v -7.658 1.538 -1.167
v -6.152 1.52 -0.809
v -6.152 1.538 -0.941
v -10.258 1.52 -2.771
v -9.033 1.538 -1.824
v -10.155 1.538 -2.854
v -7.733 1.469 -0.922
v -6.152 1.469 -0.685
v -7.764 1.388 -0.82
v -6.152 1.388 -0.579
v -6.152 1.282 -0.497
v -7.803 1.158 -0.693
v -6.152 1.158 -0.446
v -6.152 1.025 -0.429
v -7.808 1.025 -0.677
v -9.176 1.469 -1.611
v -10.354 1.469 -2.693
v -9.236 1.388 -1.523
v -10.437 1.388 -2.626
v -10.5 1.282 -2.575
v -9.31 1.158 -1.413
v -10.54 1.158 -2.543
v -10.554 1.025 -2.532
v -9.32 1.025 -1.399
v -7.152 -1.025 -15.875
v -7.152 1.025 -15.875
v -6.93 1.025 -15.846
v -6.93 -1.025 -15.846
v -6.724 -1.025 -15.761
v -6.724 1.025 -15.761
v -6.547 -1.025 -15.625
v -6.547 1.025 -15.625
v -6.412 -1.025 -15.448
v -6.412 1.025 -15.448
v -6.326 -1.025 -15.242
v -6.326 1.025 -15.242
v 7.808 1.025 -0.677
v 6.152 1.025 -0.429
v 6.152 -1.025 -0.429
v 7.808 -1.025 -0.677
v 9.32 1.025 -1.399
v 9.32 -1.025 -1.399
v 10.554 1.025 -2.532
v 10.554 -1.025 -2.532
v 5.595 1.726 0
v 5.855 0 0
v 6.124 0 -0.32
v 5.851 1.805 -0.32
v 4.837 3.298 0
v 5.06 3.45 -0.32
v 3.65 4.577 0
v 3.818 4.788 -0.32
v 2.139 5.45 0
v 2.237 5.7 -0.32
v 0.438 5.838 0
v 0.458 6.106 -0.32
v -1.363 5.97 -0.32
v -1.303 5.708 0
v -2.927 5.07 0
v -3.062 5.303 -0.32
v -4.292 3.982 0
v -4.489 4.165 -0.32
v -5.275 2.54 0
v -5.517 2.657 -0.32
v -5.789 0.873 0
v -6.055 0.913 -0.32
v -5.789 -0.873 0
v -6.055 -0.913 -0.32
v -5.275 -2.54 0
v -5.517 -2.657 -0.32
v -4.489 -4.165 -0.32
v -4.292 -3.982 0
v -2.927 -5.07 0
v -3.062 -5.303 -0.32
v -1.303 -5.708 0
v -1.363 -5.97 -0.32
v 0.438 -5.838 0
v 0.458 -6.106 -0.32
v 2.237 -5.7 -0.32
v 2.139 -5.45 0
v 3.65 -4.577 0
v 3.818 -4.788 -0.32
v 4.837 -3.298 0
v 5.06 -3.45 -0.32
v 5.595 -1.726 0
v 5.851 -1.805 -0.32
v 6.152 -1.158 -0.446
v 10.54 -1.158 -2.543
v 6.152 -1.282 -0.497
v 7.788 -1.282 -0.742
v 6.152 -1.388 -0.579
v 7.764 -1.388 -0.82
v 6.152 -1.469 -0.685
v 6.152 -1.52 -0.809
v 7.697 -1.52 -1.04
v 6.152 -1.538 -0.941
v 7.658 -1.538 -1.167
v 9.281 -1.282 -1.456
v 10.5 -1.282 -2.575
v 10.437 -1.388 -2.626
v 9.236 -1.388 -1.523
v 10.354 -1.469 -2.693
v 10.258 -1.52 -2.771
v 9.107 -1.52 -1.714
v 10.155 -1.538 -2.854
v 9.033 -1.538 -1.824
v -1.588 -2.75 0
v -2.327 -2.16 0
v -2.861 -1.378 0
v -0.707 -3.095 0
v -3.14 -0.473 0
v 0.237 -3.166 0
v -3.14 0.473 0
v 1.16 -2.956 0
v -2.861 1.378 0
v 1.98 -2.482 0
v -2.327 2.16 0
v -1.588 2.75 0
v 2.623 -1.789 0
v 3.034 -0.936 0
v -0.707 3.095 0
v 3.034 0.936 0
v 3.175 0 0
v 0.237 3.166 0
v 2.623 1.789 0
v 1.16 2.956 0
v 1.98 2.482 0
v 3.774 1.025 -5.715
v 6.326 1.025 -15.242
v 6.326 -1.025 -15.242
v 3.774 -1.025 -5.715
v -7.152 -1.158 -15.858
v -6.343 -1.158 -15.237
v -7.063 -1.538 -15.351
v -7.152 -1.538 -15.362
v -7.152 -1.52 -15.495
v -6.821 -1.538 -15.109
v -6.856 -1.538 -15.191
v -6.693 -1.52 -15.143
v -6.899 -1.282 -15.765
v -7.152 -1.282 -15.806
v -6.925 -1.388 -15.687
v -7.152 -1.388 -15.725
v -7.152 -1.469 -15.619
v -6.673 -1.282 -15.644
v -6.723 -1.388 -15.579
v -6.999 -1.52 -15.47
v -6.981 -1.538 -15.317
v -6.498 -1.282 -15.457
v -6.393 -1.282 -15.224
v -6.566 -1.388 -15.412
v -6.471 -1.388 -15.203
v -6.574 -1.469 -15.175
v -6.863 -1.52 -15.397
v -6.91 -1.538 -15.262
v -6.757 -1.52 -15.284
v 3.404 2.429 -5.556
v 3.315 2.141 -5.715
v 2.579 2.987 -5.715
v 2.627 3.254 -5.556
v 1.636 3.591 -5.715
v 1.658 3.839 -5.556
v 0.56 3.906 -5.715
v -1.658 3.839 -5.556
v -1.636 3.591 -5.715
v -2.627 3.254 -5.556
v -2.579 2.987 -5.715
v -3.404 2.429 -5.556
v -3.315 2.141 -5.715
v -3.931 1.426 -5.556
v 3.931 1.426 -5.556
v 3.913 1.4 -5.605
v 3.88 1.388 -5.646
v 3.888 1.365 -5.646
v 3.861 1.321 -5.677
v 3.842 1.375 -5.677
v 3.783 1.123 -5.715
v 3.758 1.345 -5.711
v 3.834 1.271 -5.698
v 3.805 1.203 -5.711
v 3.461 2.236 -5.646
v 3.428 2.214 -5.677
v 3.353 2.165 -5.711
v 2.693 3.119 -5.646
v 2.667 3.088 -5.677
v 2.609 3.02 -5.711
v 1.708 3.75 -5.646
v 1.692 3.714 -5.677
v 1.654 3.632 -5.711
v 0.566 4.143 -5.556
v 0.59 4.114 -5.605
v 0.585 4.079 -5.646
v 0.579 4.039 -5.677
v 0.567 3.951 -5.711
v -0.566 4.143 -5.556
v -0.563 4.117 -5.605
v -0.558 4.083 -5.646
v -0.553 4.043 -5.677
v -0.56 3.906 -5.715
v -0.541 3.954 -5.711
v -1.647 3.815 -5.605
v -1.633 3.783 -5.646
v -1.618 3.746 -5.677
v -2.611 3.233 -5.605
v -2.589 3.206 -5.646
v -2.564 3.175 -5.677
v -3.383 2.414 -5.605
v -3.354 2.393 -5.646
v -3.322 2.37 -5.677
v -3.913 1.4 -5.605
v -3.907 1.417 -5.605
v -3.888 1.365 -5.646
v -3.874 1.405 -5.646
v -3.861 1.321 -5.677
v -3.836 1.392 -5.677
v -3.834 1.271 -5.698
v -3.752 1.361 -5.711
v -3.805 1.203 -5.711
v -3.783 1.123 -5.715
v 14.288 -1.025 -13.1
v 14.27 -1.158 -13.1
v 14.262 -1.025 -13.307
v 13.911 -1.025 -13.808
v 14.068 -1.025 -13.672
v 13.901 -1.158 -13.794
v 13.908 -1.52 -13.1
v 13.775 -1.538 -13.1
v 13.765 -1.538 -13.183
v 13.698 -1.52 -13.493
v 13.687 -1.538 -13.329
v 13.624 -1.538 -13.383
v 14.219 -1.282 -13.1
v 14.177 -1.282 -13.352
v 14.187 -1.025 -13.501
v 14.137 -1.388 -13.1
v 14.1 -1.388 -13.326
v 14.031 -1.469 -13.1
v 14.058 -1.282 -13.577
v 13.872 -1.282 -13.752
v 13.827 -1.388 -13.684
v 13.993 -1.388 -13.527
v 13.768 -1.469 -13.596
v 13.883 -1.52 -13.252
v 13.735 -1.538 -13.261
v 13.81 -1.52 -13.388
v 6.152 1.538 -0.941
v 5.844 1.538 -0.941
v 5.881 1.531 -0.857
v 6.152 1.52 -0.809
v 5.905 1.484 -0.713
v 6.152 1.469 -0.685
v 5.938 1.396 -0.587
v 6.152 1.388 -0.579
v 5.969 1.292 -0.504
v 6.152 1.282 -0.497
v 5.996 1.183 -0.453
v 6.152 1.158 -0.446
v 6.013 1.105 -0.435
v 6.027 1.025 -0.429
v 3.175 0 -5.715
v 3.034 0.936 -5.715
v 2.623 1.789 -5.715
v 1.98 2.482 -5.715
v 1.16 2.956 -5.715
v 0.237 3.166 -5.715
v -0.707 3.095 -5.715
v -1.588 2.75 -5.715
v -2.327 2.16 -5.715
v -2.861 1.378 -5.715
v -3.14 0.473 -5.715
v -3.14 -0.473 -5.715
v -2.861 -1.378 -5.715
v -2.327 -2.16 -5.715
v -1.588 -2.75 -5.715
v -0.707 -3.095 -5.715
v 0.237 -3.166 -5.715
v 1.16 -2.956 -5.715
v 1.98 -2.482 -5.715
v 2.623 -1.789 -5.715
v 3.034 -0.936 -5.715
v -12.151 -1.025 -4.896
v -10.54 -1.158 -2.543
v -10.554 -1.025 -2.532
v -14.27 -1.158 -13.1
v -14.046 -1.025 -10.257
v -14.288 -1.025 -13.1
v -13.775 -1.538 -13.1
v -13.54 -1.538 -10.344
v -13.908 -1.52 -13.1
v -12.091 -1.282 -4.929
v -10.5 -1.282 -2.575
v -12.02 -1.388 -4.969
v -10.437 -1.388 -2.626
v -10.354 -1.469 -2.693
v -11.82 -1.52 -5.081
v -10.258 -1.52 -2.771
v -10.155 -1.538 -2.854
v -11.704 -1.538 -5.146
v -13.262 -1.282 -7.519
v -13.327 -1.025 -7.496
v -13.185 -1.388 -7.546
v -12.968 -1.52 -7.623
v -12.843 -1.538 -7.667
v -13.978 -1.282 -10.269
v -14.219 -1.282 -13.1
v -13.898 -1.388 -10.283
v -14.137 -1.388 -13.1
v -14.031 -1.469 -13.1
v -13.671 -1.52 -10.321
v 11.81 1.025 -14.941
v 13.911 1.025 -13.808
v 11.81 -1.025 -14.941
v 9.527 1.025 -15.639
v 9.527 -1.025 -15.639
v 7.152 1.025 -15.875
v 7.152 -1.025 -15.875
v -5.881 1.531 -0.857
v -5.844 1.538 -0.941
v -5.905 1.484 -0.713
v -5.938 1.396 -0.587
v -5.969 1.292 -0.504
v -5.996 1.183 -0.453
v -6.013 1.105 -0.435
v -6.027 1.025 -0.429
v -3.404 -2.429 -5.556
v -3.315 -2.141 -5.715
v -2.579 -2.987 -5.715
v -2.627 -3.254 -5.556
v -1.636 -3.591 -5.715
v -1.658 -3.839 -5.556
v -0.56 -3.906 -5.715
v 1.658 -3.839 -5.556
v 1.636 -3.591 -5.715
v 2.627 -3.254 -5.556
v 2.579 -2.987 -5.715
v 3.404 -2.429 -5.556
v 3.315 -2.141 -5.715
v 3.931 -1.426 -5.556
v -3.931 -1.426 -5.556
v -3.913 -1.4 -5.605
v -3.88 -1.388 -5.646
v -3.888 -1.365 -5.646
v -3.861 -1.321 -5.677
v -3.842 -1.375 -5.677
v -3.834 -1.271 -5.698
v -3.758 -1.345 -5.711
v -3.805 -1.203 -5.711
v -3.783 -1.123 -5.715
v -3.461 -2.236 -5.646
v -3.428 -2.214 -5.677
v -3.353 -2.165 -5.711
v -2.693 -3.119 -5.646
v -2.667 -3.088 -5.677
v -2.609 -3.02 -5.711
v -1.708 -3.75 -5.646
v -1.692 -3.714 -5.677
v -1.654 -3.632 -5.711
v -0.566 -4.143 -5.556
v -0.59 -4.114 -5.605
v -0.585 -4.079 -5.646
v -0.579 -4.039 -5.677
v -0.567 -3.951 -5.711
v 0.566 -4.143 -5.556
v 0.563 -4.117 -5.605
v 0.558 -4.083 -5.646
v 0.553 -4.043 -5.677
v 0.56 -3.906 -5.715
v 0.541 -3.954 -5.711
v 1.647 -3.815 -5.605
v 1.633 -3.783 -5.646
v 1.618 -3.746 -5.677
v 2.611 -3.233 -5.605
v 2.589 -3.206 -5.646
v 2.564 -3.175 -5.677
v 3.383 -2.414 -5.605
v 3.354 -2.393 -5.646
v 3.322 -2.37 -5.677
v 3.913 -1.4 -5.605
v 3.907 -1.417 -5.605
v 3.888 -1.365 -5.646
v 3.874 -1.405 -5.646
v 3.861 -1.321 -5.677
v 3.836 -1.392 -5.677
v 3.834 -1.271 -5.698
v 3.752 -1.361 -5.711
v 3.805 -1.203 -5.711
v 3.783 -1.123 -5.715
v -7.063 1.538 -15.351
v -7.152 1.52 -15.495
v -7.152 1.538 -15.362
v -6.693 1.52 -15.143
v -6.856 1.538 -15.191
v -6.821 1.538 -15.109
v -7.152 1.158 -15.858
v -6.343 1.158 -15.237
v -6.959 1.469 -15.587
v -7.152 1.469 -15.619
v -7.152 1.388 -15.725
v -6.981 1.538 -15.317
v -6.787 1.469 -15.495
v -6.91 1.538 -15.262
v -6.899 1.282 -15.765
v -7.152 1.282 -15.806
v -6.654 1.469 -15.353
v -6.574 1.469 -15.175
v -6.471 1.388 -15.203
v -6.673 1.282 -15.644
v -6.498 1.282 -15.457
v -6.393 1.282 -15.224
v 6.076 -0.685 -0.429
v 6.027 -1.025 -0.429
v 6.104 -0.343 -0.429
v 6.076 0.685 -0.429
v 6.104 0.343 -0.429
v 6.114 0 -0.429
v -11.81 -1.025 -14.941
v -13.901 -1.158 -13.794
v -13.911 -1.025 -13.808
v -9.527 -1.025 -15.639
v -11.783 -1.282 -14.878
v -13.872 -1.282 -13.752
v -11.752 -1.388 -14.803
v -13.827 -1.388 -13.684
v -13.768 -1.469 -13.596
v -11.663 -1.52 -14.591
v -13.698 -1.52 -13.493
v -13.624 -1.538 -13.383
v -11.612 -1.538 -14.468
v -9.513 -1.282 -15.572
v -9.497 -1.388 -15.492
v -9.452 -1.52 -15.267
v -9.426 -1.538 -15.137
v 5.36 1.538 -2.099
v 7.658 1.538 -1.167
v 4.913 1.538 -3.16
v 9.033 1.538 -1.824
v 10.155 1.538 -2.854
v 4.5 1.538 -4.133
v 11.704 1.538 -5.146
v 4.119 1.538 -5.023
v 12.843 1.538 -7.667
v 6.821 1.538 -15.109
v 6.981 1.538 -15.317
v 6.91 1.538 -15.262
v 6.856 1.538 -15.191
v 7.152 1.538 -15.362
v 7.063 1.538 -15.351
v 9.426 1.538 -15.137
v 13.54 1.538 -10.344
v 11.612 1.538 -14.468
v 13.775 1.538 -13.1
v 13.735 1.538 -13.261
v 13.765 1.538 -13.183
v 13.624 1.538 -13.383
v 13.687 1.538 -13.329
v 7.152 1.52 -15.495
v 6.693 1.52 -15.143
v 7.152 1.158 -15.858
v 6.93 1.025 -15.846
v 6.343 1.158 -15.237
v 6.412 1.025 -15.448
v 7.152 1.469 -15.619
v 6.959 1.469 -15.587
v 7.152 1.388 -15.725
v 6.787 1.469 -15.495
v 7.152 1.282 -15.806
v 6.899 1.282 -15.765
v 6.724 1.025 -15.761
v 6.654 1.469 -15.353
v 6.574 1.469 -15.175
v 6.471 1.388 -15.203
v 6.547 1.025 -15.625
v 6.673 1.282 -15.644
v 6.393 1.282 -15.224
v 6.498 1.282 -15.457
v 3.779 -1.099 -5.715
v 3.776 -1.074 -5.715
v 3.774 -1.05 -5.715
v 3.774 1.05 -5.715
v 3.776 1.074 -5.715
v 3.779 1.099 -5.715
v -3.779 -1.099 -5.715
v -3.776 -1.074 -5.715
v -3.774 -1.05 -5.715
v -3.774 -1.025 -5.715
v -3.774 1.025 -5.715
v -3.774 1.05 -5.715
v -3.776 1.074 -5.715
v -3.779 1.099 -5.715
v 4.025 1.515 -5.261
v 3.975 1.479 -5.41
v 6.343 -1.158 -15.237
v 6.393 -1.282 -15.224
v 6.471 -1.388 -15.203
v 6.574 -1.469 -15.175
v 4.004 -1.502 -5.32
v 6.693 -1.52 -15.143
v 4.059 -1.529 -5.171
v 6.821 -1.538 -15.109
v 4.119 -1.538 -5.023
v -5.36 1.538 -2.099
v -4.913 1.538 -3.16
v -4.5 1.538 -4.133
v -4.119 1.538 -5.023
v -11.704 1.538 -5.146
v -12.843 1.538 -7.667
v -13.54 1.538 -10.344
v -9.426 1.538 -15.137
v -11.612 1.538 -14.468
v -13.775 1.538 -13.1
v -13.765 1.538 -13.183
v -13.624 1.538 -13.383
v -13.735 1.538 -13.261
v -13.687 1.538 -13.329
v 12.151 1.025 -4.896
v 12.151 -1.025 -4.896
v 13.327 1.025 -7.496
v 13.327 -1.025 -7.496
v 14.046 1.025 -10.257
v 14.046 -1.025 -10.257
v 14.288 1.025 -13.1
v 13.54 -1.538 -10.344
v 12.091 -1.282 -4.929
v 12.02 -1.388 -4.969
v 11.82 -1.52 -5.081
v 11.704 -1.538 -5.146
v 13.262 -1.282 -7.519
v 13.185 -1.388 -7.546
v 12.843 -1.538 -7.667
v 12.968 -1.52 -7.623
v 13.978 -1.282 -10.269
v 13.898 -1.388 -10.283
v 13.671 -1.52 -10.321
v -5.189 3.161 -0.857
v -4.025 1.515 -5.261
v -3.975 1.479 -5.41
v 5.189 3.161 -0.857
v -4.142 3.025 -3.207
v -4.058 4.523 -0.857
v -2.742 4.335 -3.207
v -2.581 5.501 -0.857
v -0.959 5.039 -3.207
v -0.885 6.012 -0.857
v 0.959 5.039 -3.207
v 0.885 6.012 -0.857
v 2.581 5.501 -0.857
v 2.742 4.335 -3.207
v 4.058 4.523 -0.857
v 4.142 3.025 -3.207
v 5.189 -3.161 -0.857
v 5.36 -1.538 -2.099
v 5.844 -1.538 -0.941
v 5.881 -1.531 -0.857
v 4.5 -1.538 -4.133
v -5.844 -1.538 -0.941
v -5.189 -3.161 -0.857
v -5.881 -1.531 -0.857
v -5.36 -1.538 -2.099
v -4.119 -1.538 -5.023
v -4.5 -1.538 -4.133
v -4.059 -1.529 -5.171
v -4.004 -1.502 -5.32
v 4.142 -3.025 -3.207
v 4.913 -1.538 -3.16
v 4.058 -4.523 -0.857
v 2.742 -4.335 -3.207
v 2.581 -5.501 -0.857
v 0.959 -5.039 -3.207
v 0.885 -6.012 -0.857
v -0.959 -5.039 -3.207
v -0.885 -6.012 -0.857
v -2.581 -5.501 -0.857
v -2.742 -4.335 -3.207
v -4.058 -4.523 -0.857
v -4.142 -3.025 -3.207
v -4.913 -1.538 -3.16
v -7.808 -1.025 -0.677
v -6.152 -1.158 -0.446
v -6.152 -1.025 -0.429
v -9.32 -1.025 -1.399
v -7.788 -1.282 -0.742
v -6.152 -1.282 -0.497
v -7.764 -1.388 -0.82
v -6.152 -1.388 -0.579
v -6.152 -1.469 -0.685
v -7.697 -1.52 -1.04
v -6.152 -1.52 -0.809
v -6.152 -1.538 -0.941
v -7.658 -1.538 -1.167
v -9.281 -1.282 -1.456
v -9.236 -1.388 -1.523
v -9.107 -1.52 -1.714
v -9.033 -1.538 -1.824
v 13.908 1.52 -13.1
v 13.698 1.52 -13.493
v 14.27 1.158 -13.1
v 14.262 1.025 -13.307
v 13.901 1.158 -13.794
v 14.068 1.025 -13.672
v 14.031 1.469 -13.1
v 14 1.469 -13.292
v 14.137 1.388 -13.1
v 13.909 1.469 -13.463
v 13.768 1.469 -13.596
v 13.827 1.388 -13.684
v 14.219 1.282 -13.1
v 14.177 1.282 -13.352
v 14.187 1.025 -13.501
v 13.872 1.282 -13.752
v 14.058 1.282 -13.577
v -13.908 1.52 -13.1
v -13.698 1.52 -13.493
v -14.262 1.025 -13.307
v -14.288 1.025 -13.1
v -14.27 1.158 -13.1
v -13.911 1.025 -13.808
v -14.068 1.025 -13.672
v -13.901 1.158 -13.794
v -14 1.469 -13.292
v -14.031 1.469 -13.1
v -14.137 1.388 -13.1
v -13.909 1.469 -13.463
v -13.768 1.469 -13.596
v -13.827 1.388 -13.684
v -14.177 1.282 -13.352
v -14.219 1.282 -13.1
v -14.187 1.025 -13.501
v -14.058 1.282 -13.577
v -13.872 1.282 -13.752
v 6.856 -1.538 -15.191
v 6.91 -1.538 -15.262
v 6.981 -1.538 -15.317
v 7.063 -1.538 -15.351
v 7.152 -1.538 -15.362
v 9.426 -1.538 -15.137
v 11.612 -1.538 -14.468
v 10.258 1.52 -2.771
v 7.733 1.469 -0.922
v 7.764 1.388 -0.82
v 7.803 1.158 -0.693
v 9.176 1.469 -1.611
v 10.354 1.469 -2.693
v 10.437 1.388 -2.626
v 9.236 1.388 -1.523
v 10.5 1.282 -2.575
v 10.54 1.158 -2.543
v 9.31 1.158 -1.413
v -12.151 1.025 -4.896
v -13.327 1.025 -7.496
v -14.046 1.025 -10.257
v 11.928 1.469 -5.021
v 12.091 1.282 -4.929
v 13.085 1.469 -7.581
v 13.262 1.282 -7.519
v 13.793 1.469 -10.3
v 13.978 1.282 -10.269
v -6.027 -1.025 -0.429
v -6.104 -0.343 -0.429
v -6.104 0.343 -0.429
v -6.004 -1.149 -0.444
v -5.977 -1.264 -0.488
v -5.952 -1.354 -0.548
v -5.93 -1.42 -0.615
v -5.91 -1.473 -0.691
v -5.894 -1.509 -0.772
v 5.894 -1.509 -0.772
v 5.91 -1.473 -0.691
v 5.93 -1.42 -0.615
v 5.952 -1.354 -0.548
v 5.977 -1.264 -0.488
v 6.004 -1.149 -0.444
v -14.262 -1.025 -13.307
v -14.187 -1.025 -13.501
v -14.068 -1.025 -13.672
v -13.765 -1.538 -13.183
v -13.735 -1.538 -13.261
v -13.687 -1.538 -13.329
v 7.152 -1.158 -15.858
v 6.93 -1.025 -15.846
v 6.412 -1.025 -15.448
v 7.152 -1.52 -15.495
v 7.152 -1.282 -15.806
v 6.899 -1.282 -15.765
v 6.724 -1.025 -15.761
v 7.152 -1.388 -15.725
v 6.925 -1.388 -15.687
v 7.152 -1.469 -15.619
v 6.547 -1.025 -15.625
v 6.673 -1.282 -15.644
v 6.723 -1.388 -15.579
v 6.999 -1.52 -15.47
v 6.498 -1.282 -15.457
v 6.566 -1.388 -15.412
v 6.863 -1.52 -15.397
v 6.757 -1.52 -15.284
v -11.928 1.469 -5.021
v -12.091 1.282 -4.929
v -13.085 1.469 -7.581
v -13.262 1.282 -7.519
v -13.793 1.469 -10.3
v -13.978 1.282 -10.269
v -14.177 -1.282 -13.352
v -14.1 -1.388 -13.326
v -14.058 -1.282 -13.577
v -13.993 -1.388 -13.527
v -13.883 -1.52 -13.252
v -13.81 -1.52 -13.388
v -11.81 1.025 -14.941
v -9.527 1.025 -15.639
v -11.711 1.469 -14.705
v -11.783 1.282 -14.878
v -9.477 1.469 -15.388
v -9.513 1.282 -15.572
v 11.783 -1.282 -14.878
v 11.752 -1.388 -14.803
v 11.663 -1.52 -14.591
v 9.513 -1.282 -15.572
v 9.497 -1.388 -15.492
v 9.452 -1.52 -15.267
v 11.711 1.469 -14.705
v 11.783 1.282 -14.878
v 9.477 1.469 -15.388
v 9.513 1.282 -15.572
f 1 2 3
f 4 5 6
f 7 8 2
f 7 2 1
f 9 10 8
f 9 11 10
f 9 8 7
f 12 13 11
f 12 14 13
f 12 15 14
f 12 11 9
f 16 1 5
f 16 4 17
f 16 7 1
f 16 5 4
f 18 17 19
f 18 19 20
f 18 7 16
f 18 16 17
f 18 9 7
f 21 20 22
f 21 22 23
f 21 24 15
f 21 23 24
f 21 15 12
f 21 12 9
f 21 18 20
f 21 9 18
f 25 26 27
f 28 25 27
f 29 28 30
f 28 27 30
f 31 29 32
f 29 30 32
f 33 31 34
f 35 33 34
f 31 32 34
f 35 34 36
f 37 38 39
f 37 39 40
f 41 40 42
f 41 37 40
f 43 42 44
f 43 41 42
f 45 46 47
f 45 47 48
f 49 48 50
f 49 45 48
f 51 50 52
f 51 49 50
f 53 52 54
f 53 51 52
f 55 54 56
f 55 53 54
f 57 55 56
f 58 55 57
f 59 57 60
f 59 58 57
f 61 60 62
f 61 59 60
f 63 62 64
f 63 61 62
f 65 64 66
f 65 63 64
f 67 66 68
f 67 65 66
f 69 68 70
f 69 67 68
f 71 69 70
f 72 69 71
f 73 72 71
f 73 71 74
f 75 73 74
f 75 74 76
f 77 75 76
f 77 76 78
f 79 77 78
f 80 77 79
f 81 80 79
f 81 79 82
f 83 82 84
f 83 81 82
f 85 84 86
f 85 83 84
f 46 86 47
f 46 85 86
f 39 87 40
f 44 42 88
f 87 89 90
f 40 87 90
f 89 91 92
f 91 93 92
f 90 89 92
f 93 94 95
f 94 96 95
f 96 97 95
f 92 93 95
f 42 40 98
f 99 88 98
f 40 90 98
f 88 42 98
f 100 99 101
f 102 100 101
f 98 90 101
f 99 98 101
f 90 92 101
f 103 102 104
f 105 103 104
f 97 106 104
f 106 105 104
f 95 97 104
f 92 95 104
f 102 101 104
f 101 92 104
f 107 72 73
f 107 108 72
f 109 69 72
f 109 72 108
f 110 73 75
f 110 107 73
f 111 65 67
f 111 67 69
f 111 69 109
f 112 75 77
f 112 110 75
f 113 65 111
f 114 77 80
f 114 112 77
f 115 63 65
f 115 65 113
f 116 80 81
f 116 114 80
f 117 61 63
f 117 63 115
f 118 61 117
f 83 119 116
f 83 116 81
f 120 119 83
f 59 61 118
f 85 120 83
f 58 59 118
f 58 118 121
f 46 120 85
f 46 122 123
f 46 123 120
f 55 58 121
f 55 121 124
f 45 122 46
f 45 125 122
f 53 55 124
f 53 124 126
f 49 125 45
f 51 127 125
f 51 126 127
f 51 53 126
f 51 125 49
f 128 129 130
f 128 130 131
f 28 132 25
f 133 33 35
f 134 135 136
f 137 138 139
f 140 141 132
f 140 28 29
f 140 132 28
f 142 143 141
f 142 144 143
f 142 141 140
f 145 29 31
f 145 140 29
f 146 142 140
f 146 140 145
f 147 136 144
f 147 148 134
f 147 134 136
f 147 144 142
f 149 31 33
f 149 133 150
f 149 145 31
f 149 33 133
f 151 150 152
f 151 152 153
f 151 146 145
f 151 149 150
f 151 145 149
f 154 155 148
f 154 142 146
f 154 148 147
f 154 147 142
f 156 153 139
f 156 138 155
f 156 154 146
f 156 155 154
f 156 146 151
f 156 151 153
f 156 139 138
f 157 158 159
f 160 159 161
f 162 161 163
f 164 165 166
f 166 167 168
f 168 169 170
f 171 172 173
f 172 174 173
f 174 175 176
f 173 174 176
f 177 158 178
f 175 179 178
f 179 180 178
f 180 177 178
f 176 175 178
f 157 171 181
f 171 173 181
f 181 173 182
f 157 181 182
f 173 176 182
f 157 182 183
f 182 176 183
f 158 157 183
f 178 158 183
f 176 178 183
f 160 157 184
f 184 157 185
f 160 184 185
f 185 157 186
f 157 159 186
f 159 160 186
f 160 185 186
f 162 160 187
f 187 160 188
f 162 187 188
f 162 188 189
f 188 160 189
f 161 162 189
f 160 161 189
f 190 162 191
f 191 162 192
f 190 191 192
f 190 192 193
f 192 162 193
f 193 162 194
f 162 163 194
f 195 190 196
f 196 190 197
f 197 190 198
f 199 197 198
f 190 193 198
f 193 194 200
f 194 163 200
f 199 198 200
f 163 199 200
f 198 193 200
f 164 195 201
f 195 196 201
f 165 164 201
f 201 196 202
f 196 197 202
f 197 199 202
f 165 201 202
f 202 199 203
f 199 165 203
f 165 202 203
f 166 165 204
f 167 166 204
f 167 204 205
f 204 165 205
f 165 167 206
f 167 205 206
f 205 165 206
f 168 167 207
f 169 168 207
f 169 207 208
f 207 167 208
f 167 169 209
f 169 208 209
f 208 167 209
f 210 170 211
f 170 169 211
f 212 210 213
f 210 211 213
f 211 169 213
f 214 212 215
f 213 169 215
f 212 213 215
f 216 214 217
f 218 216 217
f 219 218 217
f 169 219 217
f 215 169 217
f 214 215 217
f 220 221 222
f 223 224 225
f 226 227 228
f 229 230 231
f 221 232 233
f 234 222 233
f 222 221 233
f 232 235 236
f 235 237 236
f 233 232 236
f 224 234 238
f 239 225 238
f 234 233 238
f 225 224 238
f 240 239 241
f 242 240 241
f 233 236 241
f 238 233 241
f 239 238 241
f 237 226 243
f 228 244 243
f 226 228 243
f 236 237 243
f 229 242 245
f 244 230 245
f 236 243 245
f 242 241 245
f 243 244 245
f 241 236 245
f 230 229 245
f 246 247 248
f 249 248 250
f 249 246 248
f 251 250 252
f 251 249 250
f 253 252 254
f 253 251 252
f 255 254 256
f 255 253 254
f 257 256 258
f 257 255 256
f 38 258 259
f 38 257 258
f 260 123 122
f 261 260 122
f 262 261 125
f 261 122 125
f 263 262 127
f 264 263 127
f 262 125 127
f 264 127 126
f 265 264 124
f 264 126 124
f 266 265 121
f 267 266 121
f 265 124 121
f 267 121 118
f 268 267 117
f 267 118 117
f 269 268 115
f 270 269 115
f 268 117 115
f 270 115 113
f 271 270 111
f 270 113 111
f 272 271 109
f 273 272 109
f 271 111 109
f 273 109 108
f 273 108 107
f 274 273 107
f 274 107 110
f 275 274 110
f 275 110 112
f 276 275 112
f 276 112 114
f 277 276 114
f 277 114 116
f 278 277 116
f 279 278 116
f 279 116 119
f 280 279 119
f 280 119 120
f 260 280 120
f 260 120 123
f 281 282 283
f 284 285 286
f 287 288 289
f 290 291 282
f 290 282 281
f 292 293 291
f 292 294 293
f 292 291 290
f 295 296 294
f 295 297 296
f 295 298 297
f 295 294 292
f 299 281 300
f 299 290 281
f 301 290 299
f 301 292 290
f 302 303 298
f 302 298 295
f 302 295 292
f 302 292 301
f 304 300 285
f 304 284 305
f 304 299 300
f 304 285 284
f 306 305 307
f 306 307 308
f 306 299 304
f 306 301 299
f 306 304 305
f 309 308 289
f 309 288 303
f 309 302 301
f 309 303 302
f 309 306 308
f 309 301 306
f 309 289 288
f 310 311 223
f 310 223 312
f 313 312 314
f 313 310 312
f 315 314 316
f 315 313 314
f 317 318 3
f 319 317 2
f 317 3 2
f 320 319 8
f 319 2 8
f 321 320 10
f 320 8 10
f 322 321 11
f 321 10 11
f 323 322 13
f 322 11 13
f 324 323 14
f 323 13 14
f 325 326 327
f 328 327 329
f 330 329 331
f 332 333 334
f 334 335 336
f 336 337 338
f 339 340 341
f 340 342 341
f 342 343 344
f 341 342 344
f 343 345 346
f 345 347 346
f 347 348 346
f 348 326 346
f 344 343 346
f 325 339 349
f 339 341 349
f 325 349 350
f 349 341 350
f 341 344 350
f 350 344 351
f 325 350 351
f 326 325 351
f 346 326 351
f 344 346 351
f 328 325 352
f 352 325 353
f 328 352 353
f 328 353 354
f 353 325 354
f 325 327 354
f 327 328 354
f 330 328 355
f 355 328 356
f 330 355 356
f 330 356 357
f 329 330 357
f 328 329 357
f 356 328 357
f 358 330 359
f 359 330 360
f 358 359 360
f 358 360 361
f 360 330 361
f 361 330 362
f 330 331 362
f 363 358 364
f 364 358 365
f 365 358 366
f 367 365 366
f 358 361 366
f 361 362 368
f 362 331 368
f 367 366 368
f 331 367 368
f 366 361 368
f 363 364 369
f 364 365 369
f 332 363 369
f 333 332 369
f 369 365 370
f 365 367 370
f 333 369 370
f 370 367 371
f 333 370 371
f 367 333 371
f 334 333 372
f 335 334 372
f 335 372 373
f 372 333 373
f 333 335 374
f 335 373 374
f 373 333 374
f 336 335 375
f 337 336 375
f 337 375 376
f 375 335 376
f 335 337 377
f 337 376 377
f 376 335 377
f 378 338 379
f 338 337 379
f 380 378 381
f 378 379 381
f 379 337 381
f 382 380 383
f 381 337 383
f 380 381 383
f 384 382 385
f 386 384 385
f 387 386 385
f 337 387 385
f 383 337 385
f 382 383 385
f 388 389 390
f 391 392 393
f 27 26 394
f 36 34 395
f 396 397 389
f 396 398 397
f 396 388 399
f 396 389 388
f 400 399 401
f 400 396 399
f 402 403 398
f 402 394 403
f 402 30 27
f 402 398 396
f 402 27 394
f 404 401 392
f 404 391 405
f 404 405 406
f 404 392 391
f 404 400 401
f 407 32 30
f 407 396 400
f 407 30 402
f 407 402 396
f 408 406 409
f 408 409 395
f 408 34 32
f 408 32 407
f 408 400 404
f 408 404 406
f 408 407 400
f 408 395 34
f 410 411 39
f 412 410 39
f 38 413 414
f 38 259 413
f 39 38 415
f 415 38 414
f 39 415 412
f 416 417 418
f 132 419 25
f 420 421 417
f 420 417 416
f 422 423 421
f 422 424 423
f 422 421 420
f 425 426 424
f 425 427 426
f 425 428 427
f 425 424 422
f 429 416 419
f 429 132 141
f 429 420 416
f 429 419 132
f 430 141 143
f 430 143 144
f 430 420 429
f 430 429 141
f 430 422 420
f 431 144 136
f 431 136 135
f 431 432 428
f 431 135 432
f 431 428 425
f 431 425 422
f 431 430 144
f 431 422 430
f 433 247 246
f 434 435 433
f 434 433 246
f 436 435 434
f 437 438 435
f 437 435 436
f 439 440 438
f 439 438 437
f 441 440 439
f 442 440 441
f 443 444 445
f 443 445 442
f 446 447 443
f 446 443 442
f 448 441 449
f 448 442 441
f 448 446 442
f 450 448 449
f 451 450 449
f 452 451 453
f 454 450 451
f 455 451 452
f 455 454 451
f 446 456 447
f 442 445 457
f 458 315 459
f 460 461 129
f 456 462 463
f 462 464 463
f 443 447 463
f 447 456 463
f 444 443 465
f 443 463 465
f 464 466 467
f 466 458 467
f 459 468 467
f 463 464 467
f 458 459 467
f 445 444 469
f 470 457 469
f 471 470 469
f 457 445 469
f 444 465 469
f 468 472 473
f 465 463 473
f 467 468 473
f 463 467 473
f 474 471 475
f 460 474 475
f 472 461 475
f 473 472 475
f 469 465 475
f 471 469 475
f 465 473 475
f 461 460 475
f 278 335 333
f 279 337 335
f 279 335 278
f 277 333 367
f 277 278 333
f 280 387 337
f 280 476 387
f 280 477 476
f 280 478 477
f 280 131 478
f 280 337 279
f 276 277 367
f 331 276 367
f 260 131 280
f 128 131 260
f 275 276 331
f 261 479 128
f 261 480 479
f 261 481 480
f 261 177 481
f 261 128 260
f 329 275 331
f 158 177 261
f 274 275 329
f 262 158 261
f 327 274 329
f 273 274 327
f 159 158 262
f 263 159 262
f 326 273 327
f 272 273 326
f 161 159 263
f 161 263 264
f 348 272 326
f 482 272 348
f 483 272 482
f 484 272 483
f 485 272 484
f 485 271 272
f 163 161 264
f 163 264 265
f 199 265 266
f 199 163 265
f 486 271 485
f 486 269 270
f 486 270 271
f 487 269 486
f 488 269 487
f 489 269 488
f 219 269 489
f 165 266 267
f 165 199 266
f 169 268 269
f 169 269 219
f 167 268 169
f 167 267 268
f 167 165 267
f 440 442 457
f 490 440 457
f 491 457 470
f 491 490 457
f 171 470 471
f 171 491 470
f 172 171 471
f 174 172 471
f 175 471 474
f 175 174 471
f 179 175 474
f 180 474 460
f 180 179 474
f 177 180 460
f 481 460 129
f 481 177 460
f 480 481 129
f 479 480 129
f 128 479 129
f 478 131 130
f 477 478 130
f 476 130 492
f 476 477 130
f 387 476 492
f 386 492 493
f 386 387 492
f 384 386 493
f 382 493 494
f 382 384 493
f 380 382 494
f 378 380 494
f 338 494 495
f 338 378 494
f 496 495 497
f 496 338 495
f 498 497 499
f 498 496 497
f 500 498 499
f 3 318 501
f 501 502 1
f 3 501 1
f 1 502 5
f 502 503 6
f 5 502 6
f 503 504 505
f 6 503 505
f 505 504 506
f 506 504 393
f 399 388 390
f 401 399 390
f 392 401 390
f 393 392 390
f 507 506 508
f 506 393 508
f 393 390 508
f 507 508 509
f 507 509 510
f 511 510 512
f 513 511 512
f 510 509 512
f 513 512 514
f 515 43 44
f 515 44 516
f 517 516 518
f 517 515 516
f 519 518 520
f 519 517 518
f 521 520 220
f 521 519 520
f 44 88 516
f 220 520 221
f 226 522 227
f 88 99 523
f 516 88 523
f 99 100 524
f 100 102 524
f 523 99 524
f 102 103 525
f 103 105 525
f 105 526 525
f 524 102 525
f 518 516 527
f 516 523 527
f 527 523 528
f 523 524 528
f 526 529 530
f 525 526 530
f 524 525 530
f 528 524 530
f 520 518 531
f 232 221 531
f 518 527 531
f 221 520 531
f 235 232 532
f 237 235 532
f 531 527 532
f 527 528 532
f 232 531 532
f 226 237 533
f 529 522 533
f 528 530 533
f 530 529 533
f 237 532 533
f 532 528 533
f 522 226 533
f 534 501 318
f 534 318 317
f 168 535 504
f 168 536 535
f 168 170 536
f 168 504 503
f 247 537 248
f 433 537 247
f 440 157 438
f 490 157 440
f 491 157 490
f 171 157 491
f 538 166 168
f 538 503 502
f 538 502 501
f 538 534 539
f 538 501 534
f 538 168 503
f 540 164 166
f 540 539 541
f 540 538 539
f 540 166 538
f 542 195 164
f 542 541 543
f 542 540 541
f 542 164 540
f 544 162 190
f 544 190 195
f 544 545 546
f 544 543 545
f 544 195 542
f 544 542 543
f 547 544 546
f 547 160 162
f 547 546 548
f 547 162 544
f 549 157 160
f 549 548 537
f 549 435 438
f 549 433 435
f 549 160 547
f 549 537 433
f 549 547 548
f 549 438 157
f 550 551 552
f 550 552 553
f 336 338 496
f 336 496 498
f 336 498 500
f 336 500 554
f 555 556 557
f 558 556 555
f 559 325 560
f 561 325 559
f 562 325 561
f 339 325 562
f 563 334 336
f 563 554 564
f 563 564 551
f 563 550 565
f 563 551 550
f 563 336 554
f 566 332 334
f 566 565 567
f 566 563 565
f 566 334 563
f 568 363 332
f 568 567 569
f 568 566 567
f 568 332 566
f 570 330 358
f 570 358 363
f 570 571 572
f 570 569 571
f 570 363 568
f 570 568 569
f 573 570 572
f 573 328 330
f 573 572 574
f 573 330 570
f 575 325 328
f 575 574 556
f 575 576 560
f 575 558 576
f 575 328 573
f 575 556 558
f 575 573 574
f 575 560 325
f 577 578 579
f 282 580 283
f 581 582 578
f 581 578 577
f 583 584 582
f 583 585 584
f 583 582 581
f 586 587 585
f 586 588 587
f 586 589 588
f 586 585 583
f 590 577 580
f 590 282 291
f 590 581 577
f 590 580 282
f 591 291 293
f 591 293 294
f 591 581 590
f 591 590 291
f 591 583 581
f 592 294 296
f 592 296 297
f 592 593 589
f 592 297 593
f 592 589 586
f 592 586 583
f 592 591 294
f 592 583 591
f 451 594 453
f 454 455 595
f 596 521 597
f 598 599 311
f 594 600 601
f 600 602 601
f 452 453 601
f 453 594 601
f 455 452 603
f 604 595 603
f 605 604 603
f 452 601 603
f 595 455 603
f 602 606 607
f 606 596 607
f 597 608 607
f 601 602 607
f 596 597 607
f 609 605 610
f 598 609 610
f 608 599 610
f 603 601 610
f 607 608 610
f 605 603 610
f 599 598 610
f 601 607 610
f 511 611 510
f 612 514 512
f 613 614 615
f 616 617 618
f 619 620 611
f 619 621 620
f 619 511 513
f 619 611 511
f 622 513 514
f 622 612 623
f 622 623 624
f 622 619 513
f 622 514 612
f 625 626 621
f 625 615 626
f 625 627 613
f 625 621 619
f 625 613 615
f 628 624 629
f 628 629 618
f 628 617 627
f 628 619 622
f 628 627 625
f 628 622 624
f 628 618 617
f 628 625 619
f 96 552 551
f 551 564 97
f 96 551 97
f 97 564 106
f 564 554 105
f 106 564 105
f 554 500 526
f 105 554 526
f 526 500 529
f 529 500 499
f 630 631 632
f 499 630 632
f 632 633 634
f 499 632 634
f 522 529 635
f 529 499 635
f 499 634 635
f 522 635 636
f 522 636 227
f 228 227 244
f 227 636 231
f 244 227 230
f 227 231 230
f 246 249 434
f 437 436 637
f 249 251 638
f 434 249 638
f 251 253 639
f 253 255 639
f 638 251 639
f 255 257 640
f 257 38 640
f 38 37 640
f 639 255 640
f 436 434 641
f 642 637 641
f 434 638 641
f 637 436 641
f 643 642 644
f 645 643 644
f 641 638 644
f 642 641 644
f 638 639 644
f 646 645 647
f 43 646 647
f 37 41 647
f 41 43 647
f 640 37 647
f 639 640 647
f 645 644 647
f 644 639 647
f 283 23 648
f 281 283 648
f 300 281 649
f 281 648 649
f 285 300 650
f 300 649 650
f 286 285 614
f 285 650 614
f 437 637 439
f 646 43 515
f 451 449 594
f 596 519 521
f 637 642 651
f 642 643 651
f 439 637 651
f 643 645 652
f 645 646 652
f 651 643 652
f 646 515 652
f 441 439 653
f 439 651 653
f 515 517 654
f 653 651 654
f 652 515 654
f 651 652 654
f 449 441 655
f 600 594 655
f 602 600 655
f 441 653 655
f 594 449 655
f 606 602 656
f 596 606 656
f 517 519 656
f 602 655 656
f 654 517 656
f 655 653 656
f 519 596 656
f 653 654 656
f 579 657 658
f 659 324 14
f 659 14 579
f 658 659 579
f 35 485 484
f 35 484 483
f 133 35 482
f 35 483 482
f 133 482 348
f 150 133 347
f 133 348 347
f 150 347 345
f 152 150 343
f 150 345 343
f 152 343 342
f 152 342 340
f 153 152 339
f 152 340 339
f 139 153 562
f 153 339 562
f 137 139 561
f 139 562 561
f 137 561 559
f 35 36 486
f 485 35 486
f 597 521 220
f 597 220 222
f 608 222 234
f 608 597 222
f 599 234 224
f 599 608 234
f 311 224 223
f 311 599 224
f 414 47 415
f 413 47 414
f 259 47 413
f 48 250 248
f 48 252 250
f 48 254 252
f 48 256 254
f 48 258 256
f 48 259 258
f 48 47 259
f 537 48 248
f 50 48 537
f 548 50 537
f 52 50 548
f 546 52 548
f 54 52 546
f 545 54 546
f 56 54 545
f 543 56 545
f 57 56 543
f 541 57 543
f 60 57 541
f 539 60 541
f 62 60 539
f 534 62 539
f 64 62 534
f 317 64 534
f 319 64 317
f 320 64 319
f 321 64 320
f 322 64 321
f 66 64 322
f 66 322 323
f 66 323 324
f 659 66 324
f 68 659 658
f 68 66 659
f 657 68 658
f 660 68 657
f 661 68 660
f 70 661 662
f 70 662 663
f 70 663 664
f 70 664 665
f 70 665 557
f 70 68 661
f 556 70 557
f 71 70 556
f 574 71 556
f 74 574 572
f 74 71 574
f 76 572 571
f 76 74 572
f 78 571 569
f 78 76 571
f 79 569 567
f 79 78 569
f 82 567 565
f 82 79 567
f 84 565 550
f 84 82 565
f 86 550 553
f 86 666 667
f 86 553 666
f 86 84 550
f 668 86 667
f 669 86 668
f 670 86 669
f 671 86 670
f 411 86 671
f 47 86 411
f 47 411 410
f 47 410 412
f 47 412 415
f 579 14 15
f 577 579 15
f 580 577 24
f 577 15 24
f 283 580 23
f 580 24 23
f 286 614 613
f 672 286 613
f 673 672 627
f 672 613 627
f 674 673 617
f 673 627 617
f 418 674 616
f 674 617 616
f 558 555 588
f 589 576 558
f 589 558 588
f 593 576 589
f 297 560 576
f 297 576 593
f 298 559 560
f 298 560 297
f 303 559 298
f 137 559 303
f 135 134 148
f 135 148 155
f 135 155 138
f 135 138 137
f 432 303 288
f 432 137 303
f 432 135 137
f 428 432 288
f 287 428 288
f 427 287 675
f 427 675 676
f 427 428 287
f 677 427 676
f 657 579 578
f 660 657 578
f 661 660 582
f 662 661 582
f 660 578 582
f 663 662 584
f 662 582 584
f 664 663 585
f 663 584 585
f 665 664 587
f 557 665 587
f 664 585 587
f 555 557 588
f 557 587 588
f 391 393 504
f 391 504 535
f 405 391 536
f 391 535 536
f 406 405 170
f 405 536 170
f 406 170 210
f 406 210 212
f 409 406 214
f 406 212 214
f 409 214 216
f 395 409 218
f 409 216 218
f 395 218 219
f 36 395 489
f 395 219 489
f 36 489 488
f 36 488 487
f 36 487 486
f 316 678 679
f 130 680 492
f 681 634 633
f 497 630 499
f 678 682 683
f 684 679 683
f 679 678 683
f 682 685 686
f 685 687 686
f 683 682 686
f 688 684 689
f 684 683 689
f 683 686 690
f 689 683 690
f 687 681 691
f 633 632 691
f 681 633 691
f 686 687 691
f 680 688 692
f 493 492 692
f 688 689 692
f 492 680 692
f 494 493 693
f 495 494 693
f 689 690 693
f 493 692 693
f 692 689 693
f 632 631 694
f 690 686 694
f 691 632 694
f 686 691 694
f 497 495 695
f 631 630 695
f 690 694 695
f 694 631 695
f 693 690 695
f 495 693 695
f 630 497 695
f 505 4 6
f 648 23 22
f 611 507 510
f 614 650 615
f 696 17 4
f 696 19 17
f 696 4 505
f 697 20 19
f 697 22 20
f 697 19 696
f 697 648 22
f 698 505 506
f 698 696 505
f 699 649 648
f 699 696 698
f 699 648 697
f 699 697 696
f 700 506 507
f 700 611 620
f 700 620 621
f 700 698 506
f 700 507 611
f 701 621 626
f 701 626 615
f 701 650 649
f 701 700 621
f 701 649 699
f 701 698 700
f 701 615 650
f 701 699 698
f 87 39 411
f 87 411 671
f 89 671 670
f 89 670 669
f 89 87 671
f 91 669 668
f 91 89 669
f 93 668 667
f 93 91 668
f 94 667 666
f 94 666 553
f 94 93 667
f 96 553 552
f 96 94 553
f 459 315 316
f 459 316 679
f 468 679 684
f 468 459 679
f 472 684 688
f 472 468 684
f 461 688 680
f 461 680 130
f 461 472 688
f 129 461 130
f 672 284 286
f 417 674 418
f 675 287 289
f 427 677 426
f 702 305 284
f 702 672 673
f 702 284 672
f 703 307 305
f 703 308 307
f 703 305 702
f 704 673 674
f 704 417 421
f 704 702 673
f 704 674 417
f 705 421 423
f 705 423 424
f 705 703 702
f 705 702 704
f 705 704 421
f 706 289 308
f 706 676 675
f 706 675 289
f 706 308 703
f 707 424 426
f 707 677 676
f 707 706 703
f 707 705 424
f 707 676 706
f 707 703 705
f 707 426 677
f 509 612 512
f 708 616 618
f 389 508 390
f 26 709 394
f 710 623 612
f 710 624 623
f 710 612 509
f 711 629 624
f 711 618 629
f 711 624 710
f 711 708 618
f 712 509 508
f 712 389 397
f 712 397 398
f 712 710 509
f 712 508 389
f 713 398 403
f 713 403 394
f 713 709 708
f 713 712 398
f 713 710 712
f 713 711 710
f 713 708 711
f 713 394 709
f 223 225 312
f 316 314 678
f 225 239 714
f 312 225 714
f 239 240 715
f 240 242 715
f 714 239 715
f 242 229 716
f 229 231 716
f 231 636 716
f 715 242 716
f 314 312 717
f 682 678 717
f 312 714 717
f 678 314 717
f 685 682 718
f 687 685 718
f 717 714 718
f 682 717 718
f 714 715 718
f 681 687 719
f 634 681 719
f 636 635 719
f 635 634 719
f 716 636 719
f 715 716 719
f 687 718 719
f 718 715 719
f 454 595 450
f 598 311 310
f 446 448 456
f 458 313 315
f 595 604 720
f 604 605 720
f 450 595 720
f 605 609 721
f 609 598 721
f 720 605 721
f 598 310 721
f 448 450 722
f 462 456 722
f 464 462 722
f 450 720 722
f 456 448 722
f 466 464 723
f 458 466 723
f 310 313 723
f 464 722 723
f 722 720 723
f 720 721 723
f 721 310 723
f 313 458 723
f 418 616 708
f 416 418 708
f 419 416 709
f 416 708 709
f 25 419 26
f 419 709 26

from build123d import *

# Parameters (mm, degrees)
EXTRUDE2_DEPTH     = 1.537890625
SKETCH3_R          = 6.1515625
EXTRUDE1_DEPTH     = 0.85725
EXTRUDE1_DRAFT     = -5
SKETCH15_R         = 6.076562843
EXTRUDE3_DEPTH     = 4.85775
EXTRUDE3_TAPER     = 21.960198558
FILLET3_R          = 0.254
SKETCH4_R          = 3.175
CUT_EXTRUDE1_DEPTH = 23.225885864
CHAMFER1_SIZE      = 0.32146875
CHAMFER1_SIZE2     = 0.296735699
FILLET4_R          = 0.512630208


with BuildPart() as part:
    # Sketch13 → Extrude2 (new, symmetric)
    with BuildSketch(Plane(origin=(0, 0, 0), x_dir=(1, 0, 0), z_dir=(0, 1, 0))):
        with BuildLine():
            Line((3.773545526, 0.428625), (6.1515625, 0.428625))
            ThreePointArc((6.1515625, 0.428625), (8.590910612, 0.981496101), (10.553521716, 2.53205836))
            ThreePointArc((10.553521716, 2.53205836), (13.326559198, 7.495965423), (14.2875, 13.10013378))
            ThreePointArc((14.2875, 13.10013378), (14.187492334, 13.501242622), (13.91088161, 13.808449953))
            ThreePointArc((13.91088161, 13.808449953), (10.685615281, 15.346823078), (7.151500977, 15.875))
            ThreePointArc((7.151500977, 15.875), (6.631385147, 15.698444466), (6.326229714, 15.241747088))
            Line((6.326229714, 15.241747088), (3.773545526, 5.715))
            Line((3.773545526, 5.715), (3.773545526, 0.428625))
        make_face()
    extrude(amount=EXTRUDE2_DEPTH, both=True)

    # Fillet4
    fillet4_edges = [part.edges().sort_by_distance(p)[0] for p in [
        (8.590910612, 1.537890625, -0.981496101),
        (4.962554013, -1.537890625, -0.428625),
        (13.326559198, 1.537890625, -7.495965423),
        (14.187492334, 1.537890625, -13.501242622),
        (10.685615281, 1.537890625, -15.346823078),
        (6.631385147, 1.537890625, -15.698444466),
        (5.04988762, 1.537890625, -10.478373544),
        (4.962554013, 1.537890625, -0.428625),
        (5.04988762, -1.537890625, -10.478373544),
        (6.631385147, -1.537890625, -15.698444466),
        (10.685615281, -1.537890625, -15.346823078),
        (14.187492334, -1.537890625, -13.501242622),
        (13.326559198, -1.537890625, -7.495965423),
        (8.590910612, -1.537890625, -0.981496101),
    ]]
    fillet(fillet4_edges, radius=FILLET4_R)


with BuildPart() as body_2:
    # Sketch3 → Extrude1 (with draft: the straight prism first)
    with BuildSketch(Plane.XY):
        Circle(SKETCH3_R)
    extrude(amount=-EXTRUDE1_DEPTH)
    # Extrude1: the draft: its side faces are tilted about the plane it starts from
    extrude1_sides = [body_2.faces().sort_by_distance(p)[0] for p in [
        (-6.1515625, 0, -0.428625),
    ]]
    draft(extrude1_sides, Plane.XY, EXTRUDE1_DRAFT)

    # Sketch15 → Extrude3 (add)
    with BuildSketch(Plane(origin=(0, 0, -0.85725), x_dir=(-1, 0, 0), z_dir=(0, 0, -1))):
        Circle(SKETCH15_R)
    extrude(amount=EXTRUDE3_DEPTH, taper=EXTRUDE3_TAPER)

    # Fillet3
    fillet3_edges = [body_2.edges().sort_by_distance(p)[0] for p in [
        (4.117828705, 0, -5.715),
    ]]
    fillet(fillet3_edges, radius=FILLET3_R)

    # Sketch4 → Cut-Extrude1 (cut, through all)
    with BuildSketch(Plane.XY):
        Circle(SKETCH4_R)
    extrude(amount=-CUT_EXTRUDE1_DEPTH, mode=Mode.SUBTRACT)

    # Chamfer1
    chamfer1_edges = [body_2.edges().sort_by_distance(p)[0] for p in [
        (-6.1515625, 0, 0),
    ]]
    chamfer1_side = [body_2.faces().sort_by_distance(p)[0] for p in [
        (-6.114062672, 0, -0.428625),
    ]]
    chamfer(chamfer1_edges, length=CHAMFER1_SIZE, length2=CHAMFER1_SIZE2, reference=chamfer1_side[0])


with BuildPart() as body_3:
    # Mirror6: mirrored copy
    add(part.part.mirror(Plane(origin=(0, 0, 0), x_dir=(0, 0, 1), z_dir=(1, 0, 0))))

    # Combine2: union part, body 2
    add(part.part)
    add(body_2.part)


solid = body_3.part
